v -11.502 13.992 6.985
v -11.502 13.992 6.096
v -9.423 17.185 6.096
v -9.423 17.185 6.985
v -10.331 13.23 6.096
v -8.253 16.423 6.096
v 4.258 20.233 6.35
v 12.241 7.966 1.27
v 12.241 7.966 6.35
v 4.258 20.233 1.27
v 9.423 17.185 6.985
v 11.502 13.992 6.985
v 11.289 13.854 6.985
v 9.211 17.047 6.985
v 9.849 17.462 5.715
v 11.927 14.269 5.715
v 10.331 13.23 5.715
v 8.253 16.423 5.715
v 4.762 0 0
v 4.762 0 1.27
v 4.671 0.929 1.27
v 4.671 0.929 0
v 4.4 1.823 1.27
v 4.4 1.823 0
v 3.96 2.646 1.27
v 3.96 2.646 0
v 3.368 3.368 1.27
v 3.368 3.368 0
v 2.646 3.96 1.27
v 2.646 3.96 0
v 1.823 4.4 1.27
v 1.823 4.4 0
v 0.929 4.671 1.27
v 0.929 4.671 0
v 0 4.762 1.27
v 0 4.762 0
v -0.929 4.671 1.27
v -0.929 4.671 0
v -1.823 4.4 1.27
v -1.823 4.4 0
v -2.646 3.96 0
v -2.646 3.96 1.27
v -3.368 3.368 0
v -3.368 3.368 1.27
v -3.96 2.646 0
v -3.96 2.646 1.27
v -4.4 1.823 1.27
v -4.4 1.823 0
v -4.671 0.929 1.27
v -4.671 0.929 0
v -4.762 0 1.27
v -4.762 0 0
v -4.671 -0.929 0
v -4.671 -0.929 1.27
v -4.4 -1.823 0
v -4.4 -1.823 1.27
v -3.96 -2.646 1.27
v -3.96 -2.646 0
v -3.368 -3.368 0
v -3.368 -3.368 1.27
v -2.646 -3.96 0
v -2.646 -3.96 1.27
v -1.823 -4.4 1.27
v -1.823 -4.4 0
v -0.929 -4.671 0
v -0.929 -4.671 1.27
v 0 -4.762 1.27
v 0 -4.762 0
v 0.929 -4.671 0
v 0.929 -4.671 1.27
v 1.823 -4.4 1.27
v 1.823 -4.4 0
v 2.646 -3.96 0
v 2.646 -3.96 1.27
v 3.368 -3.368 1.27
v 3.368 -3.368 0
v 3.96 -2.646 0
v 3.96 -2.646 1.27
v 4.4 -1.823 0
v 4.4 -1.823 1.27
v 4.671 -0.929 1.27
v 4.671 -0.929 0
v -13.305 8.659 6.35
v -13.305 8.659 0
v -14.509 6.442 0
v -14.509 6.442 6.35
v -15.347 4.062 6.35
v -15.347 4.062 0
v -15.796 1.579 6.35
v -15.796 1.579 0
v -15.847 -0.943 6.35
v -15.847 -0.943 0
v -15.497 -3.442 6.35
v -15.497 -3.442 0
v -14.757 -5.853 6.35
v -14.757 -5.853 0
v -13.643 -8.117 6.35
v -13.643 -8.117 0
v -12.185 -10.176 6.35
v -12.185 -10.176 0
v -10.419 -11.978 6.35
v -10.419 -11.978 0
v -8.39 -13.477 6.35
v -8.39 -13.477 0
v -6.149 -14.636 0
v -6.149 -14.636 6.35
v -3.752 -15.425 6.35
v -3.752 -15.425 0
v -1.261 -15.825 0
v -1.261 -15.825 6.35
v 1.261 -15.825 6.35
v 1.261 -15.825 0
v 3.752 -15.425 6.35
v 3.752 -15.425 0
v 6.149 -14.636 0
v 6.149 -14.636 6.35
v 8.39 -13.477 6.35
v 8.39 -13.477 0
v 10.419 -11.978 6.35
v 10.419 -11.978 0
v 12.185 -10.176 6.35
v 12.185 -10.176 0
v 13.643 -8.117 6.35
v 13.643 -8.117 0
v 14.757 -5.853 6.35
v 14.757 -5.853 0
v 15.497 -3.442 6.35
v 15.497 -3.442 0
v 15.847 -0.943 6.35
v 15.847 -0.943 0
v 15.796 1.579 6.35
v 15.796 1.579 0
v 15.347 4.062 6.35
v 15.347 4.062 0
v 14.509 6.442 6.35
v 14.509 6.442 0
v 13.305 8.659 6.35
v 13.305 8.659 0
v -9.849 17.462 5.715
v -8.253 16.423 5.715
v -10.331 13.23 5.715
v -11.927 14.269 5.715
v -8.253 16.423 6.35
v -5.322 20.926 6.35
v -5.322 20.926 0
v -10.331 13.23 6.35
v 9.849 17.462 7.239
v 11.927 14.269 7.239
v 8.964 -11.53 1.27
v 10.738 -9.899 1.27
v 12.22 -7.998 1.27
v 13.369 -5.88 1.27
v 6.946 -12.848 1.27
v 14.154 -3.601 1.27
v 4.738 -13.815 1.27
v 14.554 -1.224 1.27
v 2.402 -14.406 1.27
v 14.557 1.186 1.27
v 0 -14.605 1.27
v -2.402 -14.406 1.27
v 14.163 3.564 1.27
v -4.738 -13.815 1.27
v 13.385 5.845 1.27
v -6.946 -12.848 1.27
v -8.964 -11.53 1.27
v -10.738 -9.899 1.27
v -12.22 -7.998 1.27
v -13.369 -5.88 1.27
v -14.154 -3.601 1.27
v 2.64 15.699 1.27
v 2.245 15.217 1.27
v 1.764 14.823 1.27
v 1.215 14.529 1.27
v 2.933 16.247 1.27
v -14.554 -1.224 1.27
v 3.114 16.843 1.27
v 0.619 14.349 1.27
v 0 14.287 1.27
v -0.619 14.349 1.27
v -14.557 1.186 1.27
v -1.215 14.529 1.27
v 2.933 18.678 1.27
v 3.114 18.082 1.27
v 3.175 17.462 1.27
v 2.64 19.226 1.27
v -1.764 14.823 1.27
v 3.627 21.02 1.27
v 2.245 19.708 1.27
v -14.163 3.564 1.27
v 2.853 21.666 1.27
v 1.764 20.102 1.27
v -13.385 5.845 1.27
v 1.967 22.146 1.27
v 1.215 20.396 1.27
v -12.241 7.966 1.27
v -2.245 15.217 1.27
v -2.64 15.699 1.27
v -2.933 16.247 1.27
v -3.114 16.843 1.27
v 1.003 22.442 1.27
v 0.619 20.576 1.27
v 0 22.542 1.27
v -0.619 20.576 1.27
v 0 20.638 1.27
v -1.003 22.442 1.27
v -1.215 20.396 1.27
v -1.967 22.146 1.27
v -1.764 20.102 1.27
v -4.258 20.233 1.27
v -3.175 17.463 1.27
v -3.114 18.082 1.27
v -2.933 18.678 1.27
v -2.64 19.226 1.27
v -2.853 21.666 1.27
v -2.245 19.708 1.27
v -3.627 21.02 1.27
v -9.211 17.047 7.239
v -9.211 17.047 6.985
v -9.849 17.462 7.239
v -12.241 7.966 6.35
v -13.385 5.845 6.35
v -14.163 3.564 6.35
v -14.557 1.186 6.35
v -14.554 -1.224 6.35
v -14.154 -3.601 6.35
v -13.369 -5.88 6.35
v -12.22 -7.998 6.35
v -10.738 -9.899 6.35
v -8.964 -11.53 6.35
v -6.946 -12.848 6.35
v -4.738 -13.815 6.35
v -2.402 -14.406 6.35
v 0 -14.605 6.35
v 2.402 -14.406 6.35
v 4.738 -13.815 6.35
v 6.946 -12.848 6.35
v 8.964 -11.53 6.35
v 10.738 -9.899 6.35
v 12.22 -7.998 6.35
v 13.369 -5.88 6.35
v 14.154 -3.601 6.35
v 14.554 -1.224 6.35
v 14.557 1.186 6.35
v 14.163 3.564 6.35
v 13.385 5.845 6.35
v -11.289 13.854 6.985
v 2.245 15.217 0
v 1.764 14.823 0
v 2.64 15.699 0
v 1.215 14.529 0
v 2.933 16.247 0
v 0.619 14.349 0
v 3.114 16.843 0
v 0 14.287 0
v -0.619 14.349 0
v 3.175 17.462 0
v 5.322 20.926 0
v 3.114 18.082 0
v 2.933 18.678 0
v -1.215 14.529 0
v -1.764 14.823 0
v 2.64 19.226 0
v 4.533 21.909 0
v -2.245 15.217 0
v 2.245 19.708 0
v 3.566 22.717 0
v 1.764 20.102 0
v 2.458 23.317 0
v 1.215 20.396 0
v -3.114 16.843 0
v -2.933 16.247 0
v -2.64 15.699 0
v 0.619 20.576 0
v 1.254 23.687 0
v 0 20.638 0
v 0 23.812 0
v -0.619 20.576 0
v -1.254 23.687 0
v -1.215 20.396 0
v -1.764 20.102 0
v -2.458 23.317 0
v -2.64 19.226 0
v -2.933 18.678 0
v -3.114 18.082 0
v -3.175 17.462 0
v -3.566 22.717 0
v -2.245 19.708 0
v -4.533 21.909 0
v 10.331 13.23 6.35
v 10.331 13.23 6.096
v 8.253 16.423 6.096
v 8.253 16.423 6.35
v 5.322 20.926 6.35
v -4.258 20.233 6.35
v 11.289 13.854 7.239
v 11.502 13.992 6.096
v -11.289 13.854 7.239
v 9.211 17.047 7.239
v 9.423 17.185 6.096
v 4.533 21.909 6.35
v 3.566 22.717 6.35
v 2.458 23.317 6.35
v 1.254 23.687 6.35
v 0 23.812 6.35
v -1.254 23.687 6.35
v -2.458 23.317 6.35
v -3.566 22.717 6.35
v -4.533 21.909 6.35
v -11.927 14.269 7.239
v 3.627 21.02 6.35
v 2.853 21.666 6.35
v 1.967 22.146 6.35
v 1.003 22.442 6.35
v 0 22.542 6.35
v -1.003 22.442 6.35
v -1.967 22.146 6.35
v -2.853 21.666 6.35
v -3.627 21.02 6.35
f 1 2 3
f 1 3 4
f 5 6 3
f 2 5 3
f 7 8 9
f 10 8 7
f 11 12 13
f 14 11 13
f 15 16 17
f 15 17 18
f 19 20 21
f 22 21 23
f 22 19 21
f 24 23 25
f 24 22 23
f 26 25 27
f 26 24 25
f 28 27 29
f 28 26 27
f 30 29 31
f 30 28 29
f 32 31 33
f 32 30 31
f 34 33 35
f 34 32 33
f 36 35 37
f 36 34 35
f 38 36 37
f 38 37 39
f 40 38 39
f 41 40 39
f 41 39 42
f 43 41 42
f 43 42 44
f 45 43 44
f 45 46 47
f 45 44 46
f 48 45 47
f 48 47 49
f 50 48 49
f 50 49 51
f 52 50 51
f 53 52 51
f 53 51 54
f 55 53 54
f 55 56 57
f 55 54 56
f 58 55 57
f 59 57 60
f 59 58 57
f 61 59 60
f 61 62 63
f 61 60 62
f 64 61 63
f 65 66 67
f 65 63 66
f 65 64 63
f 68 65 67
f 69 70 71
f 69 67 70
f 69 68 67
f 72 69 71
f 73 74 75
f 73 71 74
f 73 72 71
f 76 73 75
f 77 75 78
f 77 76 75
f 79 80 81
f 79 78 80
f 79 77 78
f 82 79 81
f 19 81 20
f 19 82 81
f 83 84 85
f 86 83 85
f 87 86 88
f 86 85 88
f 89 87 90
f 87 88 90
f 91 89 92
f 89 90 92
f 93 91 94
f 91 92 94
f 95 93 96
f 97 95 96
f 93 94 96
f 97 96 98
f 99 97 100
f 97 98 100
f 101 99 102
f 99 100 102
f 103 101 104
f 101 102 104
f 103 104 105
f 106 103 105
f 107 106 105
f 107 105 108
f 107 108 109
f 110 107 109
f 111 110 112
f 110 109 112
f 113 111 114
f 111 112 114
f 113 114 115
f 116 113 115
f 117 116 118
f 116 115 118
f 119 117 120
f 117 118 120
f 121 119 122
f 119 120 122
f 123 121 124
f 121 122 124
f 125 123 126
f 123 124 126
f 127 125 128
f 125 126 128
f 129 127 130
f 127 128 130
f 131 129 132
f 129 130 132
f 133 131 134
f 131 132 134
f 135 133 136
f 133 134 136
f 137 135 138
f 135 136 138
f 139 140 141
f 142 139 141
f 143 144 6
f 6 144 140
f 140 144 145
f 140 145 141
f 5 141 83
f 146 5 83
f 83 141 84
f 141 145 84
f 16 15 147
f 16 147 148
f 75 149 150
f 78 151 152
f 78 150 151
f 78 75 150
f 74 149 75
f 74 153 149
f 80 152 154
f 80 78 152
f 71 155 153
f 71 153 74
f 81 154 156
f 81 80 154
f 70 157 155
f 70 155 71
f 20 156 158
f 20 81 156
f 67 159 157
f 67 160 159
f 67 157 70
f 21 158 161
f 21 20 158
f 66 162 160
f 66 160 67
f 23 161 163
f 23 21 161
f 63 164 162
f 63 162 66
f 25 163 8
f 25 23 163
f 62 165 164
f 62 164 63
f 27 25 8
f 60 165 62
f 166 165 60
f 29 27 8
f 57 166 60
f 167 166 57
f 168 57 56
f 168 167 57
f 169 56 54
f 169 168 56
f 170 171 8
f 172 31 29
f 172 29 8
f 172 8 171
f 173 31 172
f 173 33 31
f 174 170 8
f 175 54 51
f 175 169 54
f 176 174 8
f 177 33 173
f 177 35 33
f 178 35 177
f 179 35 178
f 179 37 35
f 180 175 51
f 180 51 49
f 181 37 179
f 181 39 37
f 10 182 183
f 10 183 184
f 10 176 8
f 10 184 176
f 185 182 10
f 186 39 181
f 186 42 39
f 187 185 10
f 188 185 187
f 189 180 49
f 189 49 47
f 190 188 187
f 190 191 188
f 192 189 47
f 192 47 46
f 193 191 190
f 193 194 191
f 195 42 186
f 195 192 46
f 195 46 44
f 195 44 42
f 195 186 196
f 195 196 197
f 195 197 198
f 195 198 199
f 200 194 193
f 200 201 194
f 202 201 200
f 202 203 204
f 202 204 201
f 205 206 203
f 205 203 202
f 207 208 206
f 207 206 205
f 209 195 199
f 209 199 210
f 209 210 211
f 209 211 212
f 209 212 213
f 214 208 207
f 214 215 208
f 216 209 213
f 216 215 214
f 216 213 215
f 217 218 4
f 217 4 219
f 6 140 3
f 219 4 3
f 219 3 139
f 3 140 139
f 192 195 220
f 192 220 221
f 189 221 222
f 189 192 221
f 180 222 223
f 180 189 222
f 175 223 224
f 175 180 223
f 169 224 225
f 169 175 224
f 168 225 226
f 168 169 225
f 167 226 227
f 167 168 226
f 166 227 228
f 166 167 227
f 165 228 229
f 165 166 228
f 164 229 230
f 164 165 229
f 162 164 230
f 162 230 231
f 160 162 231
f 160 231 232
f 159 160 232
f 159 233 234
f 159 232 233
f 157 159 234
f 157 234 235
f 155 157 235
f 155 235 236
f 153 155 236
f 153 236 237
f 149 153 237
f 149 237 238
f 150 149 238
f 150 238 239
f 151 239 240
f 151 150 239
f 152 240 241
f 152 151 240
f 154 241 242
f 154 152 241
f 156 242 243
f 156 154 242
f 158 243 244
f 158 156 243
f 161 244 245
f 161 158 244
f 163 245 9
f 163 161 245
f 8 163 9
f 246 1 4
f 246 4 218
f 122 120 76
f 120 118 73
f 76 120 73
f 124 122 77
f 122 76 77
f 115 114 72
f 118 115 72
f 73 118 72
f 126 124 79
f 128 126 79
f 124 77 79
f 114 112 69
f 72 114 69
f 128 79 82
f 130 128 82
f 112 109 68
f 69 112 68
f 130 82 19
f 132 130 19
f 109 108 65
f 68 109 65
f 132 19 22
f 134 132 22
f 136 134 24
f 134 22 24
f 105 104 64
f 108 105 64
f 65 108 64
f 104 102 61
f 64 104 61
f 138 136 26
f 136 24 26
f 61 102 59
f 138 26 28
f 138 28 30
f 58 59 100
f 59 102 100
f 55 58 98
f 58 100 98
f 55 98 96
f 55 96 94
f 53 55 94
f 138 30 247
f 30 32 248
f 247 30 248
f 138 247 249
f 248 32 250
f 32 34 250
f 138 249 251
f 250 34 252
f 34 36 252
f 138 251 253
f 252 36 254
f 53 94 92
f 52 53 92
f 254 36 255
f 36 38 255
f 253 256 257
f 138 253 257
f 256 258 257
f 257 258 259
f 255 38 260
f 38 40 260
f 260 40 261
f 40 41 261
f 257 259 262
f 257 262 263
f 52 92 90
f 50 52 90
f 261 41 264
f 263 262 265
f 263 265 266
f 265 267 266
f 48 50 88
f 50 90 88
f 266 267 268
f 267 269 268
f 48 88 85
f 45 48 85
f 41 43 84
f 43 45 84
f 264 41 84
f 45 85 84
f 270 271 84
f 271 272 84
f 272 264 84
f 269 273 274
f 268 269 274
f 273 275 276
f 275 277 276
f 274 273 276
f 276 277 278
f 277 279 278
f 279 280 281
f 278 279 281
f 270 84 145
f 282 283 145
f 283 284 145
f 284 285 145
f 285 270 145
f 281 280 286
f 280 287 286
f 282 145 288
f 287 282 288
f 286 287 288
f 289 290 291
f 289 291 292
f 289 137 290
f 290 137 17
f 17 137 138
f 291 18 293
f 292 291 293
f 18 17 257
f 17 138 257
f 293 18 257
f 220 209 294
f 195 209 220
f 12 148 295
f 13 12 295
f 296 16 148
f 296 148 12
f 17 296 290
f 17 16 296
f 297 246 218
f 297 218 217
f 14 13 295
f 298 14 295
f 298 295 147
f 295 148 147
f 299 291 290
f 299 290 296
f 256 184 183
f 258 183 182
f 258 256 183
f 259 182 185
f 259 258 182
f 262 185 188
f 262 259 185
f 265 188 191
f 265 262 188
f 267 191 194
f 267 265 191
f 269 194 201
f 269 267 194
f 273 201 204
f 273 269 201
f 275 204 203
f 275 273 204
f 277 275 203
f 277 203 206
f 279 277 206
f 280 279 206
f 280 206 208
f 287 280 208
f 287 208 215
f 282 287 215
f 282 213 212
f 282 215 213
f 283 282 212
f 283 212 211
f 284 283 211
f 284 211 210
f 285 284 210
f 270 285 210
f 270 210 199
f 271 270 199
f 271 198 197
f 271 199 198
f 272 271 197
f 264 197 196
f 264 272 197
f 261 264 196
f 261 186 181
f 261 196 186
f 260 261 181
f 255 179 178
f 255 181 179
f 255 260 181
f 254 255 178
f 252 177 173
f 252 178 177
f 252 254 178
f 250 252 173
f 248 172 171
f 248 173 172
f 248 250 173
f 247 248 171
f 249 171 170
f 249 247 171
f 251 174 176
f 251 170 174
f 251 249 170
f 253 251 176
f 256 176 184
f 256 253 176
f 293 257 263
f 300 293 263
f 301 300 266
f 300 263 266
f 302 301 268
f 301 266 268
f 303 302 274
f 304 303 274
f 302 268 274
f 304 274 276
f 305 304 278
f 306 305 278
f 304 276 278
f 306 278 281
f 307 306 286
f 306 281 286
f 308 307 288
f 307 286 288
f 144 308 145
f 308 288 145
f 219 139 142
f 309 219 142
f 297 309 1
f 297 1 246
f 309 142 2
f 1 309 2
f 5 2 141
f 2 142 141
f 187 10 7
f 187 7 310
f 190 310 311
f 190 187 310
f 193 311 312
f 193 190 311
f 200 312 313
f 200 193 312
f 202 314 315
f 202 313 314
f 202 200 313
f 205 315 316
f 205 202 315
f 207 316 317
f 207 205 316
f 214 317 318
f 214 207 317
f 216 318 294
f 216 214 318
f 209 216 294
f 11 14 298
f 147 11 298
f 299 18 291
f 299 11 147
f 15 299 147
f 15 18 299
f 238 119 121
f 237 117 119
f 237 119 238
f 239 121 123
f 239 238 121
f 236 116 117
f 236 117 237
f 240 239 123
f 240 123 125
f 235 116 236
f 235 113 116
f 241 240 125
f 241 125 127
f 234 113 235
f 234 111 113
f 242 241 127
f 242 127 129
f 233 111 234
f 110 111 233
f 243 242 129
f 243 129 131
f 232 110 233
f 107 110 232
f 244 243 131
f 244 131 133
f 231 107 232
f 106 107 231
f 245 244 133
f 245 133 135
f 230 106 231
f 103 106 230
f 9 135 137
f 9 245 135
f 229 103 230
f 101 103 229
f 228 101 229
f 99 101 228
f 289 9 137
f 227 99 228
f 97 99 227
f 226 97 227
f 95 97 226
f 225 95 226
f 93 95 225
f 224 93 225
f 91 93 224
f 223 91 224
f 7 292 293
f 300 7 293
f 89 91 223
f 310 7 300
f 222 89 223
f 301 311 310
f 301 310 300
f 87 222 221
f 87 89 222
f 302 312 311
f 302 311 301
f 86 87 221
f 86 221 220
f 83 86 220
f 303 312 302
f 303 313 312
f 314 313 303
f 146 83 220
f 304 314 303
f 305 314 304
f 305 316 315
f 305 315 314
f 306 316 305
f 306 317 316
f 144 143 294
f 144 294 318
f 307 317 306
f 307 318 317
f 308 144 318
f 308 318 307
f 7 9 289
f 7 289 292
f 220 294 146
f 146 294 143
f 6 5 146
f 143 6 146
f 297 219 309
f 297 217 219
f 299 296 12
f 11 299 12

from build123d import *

# Parameters (mm, degrees)
BOSS_EXTRUDE2_DEPTH = 6.35
SHELL3_T            = -1.27
SKETCH2_7_R         = 4.7625
SKETCH2_7_R_2       = 3.175
CUT_EXTRUDE2_DEPTH  = 30.315069184
BOSS_EXTRUDE3_DEPTH = 1.524
CUT_EXTRUDE3_REACH  = 34.391


with BuildPart() as part:
    # Sketch2 → Boss-Extrude2 (new body)
    with BuildSketch(Plane(origin=(0, 0, 0), x_dir=(0, 1, 0), z_dir=(0, 0, 1))):
        with BuildLine():
            Line((8.659090909, -13.305478933), (20.926136364, -5.322191573))
            ThreePointArc((20.926136364, -5.322191573), (23.8125, 0), (20.926136364, 5.322191573))
            Line((20.926136364, 5.322191573), (8.659090909, 13.305478933))
            ThreePointArc((8.659090909, 13.305478933), (-15.875, 0), (8.659090909, -13.305478933))
        make_face()
    extrude(amount=BOSS_EXTRUDE2_DEPTH)

    # Shell3
    shell3_openings = [part.faces().sort_by_distance(p)[0] for p in [
        (0, 2.303090429, 6.35),
    ]]
    offset(amount=SHELL3_T, openings=shell3_openings, kind=Kind.INTERSECTION)

    # Sketch2<7> → Cut-Extrude2 (cut, through all)
    with BuildSketch(Plane(origin=(0, 0, 0), x_dir=(0, 1, 0), z_dir=(0, 0, 1))):
        Circle(SKETCH2_7_R)
        with Locations((17.4625, 0)):
            Circle(SKETCH2_7_R_2)
    extrude(amount=CUT_EXTRUDE2_DEPTH, mode=Mode.SUBTRACT)

    # Sketch6 → Boss-Extrude3 (add)
    with BuildSketch(Plane(origin=(0, 0, 5.715), x_dir=(0, -1, 0), z_dir=(0, 0, 1))):
        Polygon((-16.423409091, 8.252527639), (-17.4625, 9.849185111), (-14.269185056, 11.927366929), (-13.230094147, 10.330709457), align=None)
        Polygon((-14.269185056, -11.927366929), (-13.230094147, -10.330709457), (-16.423409091, -8.252527639), (-17.4625, -9.849185111), align=None)
    extrude(amount=BOSS_EXTRUDE3_DEPTH)

    # Sketch8 → Cut-Extrude3 (cut, up to next)
    with BuildSketch(Plane(origin=(-5.052951293, 7.764318182, 0), x_dir=(-0.8381404052084441, -0.5454545454545457, 0), z_dir=(-0.5454545454545457, 0.8381404052084441, 0)), mode=Mode.PRIVATE) as cut_extrude3_sk1:
        Polygon((-17.272, 6.985), (-17.018, 6.985), (-17.018, 7.239), (-15.875, 7.239), (-15.875, 6.35), (-15.875, 6.096), (-17.272, 6.096), align=None)
    cut_extrude3_tool1 = extrude(cut_extrude3_sk1.sketch, amount=-CUT_EXTRUDE3_REACH, mode=Mode.PRIVATE) & part.part
    cut_extrude3 = cut_extrude3_tool1.solids().sort_by_distance((8.8178, 16.791284, 6.648784))[0]
    add(cut_extrude3, mode=Mode.SUBTRACT)

    # Mirror1: Cut-Extrude3 across plane
    add(cut_extrude3.mirror(Plane(origin=(0, 0, 0), x_dir=(0, 0, 1), z_dir=(1, 0, 0))), mode=Mode.SUBTRACT)


solid = part.part
